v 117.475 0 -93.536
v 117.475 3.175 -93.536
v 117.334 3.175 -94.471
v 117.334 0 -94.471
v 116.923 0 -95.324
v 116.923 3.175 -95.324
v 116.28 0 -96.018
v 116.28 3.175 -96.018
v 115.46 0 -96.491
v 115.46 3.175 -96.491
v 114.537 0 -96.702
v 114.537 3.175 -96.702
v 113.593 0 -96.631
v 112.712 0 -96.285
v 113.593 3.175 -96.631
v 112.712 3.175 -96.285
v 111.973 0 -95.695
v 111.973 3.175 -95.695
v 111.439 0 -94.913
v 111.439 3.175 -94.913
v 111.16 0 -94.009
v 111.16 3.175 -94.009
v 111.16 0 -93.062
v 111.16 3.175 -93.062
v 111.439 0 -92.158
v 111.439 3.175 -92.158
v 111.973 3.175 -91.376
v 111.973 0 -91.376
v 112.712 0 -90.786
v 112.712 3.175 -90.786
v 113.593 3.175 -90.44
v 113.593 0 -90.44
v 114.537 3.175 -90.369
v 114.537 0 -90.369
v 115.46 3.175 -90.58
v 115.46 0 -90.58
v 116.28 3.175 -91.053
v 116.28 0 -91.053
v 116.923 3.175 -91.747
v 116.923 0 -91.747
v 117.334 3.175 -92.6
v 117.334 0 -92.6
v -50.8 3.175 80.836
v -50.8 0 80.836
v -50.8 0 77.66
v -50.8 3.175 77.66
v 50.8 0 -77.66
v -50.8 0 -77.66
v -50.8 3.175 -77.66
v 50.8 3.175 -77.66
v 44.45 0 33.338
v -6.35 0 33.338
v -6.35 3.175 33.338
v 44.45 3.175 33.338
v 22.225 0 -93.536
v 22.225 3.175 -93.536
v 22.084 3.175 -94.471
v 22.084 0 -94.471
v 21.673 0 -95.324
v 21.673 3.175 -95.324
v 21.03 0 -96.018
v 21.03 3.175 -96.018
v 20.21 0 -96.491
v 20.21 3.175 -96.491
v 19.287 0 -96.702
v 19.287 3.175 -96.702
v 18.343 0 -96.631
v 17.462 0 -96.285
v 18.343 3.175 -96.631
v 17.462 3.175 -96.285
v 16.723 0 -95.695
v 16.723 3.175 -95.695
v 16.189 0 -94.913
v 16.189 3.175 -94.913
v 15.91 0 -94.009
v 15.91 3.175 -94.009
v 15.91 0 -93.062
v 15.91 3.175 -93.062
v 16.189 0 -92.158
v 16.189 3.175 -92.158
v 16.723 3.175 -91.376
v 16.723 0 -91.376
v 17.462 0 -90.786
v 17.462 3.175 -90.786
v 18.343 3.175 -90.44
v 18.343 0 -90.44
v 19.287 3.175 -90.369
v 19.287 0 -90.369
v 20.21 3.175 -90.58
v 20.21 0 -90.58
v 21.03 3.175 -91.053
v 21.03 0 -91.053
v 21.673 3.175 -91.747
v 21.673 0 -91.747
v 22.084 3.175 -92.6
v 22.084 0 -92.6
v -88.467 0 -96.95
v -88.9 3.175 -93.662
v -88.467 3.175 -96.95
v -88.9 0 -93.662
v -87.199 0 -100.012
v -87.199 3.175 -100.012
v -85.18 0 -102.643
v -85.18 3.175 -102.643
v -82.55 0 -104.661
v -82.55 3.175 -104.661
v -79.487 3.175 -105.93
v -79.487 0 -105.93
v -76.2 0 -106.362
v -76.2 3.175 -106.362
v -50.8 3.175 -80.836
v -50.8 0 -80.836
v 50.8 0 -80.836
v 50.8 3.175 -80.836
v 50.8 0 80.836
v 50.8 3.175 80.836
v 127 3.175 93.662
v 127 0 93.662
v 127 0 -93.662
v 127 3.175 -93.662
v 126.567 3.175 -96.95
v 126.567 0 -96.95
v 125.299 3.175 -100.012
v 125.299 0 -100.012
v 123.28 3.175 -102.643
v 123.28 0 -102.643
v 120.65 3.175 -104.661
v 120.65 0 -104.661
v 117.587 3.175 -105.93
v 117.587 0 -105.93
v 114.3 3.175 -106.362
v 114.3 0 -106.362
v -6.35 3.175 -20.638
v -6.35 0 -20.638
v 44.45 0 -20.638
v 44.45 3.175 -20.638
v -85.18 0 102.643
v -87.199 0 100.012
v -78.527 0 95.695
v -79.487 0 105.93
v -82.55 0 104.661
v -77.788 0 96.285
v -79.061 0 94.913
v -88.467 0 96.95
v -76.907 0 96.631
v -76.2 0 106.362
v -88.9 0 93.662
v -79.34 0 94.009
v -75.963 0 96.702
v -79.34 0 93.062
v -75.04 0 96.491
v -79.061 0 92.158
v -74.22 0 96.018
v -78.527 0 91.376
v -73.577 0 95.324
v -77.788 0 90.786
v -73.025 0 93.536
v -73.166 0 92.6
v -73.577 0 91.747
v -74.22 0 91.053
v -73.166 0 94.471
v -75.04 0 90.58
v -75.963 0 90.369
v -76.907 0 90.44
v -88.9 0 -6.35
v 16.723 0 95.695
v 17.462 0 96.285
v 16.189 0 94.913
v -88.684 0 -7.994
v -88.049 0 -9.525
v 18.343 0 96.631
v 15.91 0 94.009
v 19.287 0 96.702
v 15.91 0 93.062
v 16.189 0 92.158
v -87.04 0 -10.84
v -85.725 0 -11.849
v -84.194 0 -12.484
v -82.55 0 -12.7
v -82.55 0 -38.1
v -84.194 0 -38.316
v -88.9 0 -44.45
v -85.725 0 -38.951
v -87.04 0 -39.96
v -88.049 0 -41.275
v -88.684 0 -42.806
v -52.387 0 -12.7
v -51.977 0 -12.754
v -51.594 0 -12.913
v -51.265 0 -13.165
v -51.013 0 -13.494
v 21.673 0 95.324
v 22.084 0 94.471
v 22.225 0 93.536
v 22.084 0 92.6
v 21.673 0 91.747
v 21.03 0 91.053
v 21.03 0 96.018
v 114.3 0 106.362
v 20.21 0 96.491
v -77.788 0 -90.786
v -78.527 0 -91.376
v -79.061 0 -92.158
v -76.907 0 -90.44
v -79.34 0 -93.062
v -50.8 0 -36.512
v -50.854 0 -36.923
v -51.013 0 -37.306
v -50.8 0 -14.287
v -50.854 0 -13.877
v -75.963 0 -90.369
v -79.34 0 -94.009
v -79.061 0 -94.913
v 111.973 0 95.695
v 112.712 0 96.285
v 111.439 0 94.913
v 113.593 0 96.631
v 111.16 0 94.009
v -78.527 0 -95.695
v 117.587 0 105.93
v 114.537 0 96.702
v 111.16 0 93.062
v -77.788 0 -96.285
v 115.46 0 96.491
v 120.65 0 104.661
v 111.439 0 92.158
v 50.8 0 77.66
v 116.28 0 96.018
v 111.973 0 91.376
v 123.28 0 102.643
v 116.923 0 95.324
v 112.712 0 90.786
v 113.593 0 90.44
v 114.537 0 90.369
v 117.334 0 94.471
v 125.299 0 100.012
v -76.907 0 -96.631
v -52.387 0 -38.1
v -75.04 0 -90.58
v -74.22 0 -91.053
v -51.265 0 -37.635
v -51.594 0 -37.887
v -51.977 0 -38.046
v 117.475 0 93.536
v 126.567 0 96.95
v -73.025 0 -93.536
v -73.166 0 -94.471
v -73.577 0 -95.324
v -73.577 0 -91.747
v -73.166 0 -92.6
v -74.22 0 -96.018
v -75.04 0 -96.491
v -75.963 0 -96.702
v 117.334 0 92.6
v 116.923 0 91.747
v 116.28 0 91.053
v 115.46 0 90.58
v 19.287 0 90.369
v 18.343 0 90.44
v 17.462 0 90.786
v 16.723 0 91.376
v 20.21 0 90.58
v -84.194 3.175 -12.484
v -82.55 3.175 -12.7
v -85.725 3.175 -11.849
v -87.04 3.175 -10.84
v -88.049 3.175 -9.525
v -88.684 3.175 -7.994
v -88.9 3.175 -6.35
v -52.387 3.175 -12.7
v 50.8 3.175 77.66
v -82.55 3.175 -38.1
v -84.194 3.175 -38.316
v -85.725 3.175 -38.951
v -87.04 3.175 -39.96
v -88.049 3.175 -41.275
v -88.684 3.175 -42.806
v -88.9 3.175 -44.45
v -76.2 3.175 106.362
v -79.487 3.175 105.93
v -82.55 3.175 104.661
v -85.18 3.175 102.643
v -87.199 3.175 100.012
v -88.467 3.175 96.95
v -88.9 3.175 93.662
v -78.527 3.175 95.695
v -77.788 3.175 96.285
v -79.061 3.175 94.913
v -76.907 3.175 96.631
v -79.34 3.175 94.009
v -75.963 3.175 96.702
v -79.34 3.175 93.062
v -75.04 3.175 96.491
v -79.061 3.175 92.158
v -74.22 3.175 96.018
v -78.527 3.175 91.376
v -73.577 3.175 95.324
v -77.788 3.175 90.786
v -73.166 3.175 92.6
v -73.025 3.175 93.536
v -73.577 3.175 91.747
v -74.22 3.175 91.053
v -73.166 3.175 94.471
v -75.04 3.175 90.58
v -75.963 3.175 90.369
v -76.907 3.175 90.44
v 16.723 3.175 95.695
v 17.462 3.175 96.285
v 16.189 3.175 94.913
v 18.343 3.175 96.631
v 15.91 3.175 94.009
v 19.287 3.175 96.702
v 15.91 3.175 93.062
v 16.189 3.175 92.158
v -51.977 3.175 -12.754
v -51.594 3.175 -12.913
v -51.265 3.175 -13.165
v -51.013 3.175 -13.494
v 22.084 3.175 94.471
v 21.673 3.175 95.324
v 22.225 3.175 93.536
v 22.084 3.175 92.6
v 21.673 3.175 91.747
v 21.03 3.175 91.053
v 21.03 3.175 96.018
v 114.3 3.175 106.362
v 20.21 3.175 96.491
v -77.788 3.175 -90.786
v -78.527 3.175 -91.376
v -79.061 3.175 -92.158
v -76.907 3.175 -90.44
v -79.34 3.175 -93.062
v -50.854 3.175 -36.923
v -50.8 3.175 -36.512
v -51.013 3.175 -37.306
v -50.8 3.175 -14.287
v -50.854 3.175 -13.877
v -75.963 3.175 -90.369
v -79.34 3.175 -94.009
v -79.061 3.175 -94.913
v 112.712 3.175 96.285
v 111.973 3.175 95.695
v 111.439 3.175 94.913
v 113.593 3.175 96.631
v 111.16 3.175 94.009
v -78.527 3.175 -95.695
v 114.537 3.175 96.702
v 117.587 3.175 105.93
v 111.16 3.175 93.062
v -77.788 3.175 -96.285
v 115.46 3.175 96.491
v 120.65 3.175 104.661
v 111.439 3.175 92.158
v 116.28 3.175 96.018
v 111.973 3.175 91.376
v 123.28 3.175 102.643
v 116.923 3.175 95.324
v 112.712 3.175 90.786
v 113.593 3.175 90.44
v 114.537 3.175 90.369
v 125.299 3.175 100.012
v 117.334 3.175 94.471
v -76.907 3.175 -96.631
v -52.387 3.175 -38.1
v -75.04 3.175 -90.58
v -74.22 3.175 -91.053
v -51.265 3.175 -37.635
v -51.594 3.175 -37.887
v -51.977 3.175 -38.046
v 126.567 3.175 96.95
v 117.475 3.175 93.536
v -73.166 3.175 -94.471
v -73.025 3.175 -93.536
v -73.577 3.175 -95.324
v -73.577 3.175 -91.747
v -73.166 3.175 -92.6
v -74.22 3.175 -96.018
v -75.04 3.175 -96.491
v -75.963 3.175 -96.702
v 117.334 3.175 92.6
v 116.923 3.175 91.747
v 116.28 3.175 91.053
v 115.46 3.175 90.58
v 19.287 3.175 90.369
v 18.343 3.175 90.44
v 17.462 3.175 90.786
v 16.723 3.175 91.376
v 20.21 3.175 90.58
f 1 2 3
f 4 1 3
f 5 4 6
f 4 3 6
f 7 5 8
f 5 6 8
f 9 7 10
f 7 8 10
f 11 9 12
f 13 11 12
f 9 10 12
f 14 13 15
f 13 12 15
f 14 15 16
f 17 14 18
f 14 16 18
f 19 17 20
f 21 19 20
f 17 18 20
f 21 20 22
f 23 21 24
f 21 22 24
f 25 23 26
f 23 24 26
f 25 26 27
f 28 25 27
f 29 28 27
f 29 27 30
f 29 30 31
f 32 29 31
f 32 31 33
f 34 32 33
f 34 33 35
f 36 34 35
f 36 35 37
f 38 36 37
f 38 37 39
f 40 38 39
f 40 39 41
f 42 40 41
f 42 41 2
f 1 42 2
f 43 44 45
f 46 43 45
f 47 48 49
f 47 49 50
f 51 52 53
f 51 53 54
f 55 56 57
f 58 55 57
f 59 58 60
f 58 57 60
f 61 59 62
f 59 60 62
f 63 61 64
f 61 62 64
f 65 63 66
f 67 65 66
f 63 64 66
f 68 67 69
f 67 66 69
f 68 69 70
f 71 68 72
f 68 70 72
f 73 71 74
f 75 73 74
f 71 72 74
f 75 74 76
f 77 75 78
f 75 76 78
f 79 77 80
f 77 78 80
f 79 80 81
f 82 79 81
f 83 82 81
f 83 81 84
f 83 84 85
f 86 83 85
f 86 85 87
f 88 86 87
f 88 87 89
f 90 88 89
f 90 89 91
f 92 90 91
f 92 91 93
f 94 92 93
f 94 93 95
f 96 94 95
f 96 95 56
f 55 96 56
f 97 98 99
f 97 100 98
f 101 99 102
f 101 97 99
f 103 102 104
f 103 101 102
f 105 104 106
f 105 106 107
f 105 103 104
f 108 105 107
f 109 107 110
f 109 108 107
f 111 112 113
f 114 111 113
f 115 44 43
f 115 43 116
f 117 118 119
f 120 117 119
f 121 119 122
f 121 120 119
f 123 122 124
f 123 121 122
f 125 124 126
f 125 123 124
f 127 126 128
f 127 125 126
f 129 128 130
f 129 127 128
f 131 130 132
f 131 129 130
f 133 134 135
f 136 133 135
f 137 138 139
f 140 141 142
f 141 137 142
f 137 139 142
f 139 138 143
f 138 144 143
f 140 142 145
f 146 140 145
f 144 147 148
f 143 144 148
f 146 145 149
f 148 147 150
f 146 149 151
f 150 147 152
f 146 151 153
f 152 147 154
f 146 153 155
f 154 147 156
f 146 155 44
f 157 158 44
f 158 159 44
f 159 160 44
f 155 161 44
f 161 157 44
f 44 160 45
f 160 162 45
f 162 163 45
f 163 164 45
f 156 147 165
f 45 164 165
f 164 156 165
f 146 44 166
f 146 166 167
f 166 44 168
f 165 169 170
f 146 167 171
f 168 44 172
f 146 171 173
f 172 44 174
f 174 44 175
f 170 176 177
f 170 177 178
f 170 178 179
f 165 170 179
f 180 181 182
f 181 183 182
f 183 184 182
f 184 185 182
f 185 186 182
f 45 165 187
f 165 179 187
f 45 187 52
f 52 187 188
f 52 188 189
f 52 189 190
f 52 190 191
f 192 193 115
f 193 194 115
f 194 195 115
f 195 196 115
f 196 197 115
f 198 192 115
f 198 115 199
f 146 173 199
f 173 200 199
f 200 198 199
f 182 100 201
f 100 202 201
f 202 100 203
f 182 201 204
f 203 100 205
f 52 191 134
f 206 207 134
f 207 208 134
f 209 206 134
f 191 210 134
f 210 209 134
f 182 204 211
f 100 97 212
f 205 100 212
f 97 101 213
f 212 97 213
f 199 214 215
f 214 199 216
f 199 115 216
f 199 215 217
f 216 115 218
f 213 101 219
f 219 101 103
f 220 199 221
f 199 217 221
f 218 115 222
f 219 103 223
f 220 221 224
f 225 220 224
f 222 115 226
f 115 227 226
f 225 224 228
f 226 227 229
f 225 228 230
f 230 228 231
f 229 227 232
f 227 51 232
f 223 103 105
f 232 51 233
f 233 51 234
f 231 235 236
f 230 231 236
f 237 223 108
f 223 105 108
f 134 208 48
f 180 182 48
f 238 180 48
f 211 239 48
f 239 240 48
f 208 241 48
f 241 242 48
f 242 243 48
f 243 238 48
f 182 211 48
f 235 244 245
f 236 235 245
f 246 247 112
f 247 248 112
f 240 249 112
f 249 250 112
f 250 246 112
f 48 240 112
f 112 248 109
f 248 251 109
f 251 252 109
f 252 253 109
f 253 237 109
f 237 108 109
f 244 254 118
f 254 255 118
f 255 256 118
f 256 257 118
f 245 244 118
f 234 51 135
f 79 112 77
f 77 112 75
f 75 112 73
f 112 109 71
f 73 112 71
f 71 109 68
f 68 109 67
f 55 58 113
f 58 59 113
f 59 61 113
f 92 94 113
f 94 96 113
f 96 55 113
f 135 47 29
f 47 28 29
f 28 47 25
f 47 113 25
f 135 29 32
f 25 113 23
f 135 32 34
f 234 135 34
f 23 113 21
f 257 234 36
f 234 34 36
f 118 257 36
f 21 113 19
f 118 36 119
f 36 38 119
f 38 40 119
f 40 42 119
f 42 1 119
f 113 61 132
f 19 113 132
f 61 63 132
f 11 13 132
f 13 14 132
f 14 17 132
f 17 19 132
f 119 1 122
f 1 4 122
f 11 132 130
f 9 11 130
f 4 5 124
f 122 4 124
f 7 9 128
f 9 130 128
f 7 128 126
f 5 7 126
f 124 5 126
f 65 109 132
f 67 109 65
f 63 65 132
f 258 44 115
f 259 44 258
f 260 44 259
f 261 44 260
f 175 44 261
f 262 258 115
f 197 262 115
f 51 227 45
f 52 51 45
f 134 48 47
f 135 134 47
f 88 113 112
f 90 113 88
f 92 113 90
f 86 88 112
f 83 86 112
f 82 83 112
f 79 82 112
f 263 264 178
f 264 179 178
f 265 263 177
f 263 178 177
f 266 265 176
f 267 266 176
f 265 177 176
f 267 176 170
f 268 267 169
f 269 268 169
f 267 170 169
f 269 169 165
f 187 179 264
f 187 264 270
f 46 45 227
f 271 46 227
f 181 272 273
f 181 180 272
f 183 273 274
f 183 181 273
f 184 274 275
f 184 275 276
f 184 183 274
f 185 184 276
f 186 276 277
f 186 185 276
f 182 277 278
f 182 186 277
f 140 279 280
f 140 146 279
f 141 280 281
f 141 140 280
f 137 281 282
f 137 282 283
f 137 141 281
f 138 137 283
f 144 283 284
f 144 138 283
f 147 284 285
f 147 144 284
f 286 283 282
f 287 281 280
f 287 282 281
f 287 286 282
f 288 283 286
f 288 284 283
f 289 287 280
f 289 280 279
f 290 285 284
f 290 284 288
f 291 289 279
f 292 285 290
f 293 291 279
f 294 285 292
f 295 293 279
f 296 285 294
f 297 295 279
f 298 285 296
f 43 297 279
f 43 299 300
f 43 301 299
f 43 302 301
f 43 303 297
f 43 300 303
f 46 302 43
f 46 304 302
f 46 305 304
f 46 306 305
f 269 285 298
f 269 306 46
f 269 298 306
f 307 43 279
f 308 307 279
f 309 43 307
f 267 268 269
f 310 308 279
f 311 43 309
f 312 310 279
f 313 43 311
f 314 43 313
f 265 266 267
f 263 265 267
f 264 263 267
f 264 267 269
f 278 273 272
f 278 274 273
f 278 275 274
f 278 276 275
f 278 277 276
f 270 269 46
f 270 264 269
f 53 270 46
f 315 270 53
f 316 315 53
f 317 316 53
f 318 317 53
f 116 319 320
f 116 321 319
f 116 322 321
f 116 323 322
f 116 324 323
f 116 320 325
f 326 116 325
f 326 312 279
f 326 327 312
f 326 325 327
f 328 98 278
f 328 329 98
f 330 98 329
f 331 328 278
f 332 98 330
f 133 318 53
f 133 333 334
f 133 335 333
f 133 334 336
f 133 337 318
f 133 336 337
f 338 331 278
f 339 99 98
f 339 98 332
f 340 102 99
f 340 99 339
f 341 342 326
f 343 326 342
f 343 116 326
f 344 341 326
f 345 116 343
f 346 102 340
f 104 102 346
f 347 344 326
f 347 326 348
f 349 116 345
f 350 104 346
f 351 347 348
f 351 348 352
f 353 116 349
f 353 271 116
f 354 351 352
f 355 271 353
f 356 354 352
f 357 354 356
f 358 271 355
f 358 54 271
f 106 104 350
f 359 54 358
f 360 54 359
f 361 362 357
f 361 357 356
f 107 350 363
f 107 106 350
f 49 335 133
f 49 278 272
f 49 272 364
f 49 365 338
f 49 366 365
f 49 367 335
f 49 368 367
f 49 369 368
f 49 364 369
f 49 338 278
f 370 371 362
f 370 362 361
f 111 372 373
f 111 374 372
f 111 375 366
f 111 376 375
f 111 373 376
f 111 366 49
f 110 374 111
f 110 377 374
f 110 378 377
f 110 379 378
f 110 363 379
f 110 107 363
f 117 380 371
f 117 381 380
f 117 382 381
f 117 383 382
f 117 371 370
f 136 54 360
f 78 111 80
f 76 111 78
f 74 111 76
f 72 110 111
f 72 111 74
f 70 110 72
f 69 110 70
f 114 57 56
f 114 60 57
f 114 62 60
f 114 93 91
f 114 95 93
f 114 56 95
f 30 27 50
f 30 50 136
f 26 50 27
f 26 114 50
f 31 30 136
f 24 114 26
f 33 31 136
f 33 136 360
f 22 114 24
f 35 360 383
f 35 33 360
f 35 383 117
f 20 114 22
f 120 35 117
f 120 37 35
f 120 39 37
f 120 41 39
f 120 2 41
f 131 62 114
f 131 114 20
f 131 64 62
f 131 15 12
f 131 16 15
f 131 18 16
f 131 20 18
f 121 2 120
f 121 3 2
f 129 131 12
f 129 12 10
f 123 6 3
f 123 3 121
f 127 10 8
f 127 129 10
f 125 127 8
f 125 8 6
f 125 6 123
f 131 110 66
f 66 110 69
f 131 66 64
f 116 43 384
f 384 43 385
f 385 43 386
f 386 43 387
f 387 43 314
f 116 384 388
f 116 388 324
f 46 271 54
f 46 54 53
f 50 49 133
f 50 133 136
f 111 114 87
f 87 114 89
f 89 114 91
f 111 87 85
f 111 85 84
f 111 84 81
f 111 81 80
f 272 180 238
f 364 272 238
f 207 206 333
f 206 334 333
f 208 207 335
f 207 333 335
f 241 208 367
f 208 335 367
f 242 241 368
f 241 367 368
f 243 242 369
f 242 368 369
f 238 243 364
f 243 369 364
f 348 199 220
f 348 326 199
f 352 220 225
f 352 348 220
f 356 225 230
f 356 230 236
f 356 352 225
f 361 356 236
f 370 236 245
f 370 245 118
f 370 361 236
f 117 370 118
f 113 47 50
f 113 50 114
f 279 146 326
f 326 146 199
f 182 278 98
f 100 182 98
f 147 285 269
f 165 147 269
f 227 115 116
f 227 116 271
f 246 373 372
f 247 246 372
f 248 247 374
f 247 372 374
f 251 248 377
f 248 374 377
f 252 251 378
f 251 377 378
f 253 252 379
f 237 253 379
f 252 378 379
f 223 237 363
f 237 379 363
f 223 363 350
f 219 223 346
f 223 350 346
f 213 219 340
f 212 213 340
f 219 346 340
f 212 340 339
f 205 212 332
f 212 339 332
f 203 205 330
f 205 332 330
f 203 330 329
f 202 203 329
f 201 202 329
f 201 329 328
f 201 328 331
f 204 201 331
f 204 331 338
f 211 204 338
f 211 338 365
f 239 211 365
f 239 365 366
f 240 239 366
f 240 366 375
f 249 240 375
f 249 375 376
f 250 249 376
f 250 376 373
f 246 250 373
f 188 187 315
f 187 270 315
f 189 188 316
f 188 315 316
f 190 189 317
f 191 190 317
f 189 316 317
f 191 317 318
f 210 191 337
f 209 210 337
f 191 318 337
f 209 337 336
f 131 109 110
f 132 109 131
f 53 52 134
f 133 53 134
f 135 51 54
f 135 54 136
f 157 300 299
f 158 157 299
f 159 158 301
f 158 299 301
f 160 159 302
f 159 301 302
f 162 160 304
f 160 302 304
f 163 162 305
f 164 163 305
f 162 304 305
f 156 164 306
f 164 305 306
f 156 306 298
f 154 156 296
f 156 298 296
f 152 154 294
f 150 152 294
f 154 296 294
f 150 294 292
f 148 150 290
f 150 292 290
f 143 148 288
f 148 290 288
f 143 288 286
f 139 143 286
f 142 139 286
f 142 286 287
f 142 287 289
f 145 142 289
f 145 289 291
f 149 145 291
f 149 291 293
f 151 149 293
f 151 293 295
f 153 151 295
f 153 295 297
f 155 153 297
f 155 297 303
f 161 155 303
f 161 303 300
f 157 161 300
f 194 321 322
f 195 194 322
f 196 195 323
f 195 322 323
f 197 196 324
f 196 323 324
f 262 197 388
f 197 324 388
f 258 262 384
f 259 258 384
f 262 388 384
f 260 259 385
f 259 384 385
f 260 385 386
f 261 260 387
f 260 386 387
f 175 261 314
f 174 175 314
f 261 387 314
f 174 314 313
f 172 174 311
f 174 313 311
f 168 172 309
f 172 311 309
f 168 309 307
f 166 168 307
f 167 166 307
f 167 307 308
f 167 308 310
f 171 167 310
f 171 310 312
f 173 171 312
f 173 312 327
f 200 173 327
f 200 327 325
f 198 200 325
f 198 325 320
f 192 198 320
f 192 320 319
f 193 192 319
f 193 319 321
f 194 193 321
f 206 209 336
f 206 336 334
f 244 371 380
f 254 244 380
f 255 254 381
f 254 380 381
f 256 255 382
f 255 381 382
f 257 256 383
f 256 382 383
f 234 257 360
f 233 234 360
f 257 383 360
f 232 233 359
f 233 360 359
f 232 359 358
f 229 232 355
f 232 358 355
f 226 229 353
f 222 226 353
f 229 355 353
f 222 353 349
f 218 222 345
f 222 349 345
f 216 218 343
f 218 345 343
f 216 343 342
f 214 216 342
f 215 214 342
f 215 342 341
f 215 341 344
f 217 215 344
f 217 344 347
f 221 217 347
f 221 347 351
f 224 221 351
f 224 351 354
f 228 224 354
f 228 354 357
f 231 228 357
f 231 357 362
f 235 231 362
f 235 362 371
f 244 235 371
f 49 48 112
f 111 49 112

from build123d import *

# Parameters (mm, degrees)
SKETCH1_W               = 254
SKETCH1_H               = 212.725
SKETCH1_W_2             = 101.6
SKETCH1_H_2             = 3.175
SKETCH1_W_3             = 50.8
SKETCH1_H_3             = 53.975
SKETCH1_W_4             = 57.15
SKETCH1_H_4             = 25.4
BOSS_EXTRUDE1_DEPTH     = 3.175
SKETCH3_W               = 38.1
SKETCH3_H               = 212.725
CUT_EXTRUDE2_DEPTH      = 4.175
FILLET1_R               = 12.7
SKETCH2_R               = 3.175
CUT_EXTRUDE1_DEPTH      = 1
CUT_EXTRUDE1_DEPTH_BACK = 4.175
FILLET2_R               = 1.5875
FILLET3_R               = 6.35


with BuildPart() as part:
    # Sketch1 → Boss-Extrude1 (new body)
    with BuildSketch(Plane(origin=(0, 0, 0), x_dir=(1, 0, 0), z_dir=(0, 1, 0))):
        Rectangle(SKETCH1_W, SKETCH1_H)
        with Locations((0, 79.248)):
            Rectangle(SKETCH1_W_2, SKETCH1_H_2, mode=Mode.SUBTRACT)
        with Locations((0, -79.248)):
            Rectangle(SKETCH1_W_2, SKETCH1_H_2, mode=Mode.SUBTRACT)
        with Locations((19.05, -6.35)):
            Rectangle(SKETCH1_W_3, SKETCH1_H_3, mode=Mode.SUBTRACT)
        with Locations((-79.375, 25.4)):
            Rectangle(SKETCH1_W_4, SKETCH1_H_4, mode=Mode.SUBTRACT)
    extrude(amount=BOSS_EXTRUDE1_DEPTH)

    # Sketch3 → Cut-Extrude2 (cut, through all)
    with BuildSketch(Plane(origin=(0, 3.175, 0), x_dir=(1, 0, 0), z_dir=(0, 1, 0))):
        with Locations((-107.95, 0)):
            Rectangle(SKETCH3_W, SKETCH3_H)
    extrude(amount=-CUT_EXTRUDE2_DEPTH, mode=Mode.SUBTRACT)

    # Fillet1
    fillet1_edges = [part.edges().sort_by_distance(p)[0] for p in [
        (127, 1.5875, 106.3625),
        (-88.9, 1.5875, -106.3625),
        (127, 1.5875, -106.3625),
        (-88.9, 1.5875, 106.3625),
    ]]
    fillet(fillet1_edges, radius=FILLET1_R)

    # Sketch2 → Cut-Extrude1 (cut, two sides)
    with BuildSketch(Plane(origin=(0, 3.175, 0), x_dir=(1, 0, 0), z_dir=(0, 1, 0))) as cut_extrude1_sk:
        with Locations((114.3, 93.5355)):
            Circle(SKETCH2_R)
        with Locations((114.3, -93.5355)):
            Circle(SKETCH2_R)
        with Locations((-76.2, -93.5355)):
            Circle(SKETCH2_R)
        with Locations((-76.2, 93.5355)):
            Circle(SKETCH2_R)
        with Locations((19.05, -93.5355)):
            Circle(SKETCH2_R)
        with Locations((19.05, 93.5355)):
            Circle(SKETCH2_R)
    extrude(amount=CUT_EXTRUDE1_DEPTH, mode=Mode.SUBTRACT)
    extrude(cut_extrude1_sk.sketch, amount=-CUT_EXTRUDE1_DEPTH_BACK, mode=Mode.SUBTRACT)

    # Fillet2
    fillet2_edges = [part.edges().sort_by_distance(p)[0] for p in [
        (-50.8, 1.5875, -12.7),
        (-50.8, 1.5875, -38.1),
    ]]
    fillet(fillet2_edges, radius=FILLET2_R)

    # Fillet3
    fillet3_edges = [part.edges().sort_by_distance(p)[0] for p in [
        (-88.9, 1.5875, -12.7),
        (-88.9, 1.5875, -38.1),
    ]]
    fillet(fillet3_edges, radius=FILLET3_R)


solid = part.part
